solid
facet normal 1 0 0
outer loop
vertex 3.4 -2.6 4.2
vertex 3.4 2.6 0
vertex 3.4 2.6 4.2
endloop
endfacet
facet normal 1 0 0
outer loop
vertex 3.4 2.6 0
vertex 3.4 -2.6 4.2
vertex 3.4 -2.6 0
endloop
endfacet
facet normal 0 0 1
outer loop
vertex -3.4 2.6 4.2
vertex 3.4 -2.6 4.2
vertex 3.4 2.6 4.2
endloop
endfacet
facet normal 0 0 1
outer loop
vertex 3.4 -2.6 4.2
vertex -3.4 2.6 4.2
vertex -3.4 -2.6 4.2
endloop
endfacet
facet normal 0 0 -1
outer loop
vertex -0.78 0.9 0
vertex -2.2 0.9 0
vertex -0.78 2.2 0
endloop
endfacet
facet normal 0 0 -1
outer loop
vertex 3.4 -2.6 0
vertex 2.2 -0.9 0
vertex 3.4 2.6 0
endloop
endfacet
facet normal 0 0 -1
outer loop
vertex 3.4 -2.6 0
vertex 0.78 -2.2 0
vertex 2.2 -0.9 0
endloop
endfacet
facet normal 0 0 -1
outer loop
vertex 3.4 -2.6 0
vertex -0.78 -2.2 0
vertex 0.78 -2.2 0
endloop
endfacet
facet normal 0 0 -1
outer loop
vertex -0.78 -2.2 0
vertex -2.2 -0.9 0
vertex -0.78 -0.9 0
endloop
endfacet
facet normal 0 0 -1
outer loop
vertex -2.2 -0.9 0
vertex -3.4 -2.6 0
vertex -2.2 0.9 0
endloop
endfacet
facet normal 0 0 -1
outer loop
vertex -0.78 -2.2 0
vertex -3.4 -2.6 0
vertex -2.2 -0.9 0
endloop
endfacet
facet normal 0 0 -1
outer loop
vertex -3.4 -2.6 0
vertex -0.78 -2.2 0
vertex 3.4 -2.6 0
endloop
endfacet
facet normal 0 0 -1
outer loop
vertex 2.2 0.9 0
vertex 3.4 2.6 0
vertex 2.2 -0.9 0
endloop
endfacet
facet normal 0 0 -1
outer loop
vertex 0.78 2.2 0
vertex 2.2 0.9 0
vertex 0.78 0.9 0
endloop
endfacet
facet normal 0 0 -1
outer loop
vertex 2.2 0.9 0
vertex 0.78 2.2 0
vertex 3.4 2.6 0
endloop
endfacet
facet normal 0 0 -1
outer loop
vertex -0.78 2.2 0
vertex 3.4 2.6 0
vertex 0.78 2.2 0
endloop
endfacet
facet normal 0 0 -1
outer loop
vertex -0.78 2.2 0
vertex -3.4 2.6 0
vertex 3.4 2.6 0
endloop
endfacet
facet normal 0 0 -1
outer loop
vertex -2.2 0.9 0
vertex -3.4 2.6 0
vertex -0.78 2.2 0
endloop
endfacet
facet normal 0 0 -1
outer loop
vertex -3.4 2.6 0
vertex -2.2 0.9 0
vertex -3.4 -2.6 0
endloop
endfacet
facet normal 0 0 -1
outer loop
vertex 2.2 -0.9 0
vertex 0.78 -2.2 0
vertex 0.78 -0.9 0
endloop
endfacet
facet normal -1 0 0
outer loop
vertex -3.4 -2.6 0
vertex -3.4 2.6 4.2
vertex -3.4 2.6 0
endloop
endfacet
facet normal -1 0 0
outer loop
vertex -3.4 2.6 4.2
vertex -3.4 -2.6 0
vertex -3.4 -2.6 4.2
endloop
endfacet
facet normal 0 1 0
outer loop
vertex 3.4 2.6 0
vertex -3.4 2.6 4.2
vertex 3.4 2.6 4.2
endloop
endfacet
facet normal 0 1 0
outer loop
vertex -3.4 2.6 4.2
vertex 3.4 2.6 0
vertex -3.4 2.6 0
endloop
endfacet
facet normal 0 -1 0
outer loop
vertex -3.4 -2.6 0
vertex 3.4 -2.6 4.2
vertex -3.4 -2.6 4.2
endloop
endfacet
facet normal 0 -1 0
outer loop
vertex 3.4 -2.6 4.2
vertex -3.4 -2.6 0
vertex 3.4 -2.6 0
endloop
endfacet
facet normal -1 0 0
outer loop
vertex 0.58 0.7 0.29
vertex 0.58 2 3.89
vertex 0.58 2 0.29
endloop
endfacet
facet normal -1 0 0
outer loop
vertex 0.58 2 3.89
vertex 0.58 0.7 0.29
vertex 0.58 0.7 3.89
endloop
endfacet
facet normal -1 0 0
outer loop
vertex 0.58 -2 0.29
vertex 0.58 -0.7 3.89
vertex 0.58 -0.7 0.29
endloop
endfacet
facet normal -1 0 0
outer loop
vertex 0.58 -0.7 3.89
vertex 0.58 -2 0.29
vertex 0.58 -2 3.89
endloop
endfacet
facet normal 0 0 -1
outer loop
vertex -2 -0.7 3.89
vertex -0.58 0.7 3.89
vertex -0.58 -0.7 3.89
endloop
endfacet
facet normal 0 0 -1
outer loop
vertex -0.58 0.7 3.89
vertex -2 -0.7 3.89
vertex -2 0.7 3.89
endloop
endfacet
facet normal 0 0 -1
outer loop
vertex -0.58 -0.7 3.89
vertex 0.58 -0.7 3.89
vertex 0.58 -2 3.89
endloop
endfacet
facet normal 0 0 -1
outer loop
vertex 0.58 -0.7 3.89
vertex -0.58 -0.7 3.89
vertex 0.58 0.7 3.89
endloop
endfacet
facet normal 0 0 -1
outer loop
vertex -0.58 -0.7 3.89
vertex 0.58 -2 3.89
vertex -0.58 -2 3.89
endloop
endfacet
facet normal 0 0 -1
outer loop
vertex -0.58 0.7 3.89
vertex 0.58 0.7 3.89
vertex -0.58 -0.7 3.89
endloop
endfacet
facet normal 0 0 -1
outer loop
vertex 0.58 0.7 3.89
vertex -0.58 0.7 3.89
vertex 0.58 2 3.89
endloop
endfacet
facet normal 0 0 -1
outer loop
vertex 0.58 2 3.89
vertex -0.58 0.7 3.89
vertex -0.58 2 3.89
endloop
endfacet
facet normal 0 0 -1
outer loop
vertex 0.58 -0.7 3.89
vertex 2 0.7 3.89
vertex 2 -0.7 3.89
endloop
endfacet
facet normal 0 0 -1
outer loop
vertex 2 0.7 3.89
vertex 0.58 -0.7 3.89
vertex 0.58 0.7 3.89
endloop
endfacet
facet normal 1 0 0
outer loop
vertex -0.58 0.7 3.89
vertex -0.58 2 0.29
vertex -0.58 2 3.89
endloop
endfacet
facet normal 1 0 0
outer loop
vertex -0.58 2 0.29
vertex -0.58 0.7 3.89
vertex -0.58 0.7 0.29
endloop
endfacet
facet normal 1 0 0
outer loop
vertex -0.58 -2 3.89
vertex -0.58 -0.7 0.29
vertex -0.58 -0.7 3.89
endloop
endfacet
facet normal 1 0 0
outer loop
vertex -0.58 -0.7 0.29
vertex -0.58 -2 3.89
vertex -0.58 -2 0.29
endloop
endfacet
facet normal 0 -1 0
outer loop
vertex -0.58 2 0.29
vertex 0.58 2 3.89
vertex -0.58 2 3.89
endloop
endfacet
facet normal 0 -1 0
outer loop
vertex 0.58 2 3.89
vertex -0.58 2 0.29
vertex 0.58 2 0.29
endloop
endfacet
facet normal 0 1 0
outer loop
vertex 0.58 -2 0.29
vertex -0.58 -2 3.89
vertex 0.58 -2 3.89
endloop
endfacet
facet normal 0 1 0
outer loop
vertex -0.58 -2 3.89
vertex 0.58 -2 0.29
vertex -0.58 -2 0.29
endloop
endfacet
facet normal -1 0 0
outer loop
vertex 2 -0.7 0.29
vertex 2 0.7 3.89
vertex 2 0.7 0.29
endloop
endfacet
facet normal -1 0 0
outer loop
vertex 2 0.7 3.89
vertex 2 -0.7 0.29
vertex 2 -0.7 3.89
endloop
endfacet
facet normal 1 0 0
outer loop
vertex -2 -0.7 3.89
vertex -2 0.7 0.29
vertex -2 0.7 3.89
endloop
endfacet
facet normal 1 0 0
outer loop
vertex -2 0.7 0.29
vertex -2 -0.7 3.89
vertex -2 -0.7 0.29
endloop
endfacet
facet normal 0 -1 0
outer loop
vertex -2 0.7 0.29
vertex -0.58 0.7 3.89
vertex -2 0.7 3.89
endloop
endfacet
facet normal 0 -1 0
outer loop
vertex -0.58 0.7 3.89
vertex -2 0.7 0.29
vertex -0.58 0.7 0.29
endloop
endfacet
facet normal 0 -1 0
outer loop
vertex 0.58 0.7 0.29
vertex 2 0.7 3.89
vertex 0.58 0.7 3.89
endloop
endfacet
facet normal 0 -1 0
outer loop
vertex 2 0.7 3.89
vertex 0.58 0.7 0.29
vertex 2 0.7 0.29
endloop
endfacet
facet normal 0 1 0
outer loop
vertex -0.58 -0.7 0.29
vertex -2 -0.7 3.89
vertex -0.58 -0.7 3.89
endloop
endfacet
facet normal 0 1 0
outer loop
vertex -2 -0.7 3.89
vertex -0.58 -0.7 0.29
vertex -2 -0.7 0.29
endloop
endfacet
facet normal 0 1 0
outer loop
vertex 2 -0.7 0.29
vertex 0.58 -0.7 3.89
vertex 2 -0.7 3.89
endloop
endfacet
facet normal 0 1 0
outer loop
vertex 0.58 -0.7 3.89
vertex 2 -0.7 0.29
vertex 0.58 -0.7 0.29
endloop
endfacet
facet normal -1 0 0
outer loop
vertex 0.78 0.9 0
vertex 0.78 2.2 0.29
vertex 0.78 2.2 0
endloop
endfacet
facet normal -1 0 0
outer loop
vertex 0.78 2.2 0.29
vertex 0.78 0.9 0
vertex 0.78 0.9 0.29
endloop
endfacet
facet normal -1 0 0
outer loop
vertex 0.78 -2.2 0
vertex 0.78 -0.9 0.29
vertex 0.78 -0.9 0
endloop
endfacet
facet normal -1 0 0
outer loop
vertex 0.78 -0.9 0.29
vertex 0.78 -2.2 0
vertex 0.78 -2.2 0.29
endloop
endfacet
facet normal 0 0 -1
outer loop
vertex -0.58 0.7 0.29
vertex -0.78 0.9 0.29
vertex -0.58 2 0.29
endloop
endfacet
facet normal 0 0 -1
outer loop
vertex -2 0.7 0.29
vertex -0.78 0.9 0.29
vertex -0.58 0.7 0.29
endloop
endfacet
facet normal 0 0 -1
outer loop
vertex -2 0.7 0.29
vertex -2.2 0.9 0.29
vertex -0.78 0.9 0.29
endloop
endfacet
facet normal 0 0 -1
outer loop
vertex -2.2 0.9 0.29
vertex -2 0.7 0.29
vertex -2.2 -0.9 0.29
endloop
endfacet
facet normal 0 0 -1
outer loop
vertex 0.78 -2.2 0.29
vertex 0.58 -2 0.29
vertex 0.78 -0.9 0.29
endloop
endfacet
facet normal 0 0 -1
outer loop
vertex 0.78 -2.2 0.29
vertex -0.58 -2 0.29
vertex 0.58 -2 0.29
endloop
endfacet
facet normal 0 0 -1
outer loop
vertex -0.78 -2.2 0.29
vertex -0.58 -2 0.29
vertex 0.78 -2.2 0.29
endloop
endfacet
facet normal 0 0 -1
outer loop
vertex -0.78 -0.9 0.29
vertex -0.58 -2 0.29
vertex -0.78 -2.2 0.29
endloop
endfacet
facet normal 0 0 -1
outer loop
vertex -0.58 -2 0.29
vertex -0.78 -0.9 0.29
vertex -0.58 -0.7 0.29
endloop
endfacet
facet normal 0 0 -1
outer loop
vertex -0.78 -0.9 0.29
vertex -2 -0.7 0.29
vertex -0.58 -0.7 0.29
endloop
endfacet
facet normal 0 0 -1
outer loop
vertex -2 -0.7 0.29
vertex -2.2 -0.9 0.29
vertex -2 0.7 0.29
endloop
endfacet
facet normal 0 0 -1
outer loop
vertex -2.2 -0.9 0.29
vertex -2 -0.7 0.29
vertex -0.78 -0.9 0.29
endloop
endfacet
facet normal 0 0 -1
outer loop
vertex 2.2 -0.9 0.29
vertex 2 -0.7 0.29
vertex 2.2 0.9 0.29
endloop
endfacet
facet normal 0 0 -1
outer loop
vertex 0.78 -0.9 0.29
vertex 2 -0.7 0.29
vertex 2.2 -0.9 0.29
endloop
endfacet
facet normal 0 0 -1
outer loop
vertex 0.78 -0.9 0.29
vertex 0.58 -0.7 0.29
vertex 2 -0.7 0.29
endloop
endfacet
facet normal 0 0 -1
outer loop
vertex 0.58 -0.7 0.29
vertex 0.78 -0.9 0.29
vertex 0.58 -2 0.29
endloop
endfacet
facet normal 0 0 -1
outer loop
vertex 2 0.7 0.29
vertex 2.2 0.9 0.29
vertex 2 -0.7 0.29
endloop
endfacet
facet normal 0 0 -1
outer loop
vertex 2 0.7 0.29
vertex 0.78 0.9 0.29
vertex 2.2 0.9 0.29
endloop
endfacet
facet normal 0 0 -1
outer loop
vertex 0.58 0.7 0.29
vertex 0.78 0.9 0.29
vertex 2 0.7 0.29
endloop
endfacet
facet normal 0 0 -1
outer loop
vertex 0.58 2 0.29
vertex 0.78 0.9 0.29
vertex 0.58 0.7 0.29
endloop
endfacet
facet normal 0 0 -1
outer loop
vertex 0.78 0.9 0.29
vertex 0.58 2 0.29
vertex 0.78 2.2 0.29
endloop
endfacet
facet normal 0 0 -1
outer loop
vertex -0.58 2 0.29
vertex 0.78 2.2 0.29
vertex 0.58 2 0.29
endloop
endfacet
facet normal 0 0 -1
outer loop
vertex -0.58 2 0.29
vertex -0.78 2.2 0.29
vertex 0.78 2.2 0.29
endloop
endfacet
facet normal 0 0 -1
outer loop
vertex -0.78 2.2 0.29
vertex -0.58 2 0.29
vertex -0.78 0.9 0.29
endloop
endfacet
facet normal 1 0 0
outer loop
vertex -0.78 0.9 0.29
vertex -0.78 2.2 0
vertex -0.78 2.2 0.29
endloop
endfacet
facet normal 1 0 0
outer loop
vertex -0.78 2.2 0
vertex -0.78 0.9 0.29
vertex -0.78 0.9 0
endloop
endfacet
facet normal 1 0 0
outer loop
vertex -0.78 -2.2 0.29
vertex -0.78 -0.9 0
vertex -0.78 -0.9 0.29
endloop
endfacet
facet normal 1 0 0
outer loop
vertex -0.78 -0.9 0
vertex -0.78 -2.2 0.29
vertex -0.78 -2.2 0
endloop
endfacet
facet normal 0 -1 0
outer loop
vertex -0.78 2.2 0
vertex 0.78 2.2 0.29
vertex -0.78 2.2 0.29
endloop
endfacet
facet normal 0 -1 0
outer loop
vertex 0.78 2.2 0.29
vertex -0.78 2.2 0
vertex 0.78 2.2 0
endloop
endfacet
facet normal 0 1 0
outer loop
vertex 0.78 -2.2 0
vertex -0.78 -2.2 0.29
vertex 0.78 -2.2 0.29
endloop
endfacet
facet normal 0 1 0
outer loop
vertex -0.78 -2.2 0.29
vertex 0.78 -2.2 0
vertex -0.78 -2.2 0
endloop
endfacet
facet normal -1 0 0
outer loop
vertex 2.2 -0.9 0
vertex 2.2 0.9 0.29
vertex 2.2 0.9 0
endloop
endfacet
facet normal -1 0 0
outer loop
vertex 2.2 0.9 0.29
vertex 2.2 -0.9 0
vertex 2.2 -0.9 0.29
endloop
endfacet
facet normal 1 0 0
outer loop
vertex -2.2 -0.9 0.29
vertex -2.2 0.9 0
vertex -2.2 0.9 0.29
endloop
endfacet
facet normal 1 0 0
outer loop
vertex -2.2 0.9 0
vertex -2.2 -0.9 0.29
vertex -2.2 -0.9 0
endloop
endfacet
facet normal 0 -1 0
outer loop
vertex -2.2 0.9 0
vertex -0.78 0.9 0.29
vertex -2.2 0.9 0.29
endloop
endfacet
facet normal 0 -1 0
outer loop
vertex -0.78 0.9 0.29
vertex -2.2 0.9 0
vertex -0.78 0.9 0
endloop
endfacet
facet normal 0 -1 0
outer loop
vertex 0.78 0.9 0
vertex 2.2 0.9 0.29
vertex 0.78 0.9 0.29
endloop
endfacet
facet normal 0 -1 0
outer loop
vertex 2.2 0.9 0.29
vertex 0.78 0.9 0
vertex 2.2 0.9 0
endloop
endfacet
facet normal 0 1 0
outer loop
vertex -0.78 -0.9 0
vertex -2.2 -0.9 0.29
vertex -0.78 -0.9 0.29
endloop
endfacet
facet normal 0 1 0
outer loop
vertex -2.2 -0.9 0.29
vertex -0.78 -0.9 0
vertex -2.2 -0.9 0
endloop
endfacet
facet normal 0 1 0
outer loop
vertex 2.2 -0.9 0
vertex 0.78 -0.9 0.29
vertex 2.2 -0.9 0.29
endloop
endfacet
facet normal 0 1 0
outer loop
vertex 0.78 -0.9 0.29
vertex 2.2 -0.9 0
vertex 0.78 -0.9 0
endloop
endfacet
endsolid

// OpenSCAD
$fn=180;
eps=0.01;

// Params Cherry mate
cherry_thick1=1.16;
cherry_thick2=1.40;
cherry_wide=4.00;
cherry_high=3.90;
//shaft_high=5.00;
shaft_high=cherry_high+0.3;
shaft_wide=6.80;
shaft_deep=5.20;
fudge_high=0.30;
fudge_plus=0.40;

// Cherry mate
difference() {
    // base body
    translate([0, 0, shaft_high/2]) cube([shaft_wide, shaft_deep, shaft_high], center=true);
    // cherry splines
    translate([0, 0, cherry_high/2-eps]) 
        cube([cherry_thick1, cherry_wide, cherry_high], center=true); 
    translate([0, 0, cherry_high/2-eps]) 
        cube([cherry_wide, cherry_thick2, cherry_high], center=true); 
    // fudge bottom layer
    translate([0, 0, fudge_high/2-eps]) 
        cube([cherry_thick1+fudge_plus, cherry_wide+fudge_plus, fudge_high], center=true); 
    translate([0, 0, fudge_high/2-eps]) 
        cube([cherry_wide+fudge_plus, cherry_thick2+fudge_plus, fudge_high], center=true);
    
    
    // debug
    //translate([0, 0, -0.01]) cube(90);
}
